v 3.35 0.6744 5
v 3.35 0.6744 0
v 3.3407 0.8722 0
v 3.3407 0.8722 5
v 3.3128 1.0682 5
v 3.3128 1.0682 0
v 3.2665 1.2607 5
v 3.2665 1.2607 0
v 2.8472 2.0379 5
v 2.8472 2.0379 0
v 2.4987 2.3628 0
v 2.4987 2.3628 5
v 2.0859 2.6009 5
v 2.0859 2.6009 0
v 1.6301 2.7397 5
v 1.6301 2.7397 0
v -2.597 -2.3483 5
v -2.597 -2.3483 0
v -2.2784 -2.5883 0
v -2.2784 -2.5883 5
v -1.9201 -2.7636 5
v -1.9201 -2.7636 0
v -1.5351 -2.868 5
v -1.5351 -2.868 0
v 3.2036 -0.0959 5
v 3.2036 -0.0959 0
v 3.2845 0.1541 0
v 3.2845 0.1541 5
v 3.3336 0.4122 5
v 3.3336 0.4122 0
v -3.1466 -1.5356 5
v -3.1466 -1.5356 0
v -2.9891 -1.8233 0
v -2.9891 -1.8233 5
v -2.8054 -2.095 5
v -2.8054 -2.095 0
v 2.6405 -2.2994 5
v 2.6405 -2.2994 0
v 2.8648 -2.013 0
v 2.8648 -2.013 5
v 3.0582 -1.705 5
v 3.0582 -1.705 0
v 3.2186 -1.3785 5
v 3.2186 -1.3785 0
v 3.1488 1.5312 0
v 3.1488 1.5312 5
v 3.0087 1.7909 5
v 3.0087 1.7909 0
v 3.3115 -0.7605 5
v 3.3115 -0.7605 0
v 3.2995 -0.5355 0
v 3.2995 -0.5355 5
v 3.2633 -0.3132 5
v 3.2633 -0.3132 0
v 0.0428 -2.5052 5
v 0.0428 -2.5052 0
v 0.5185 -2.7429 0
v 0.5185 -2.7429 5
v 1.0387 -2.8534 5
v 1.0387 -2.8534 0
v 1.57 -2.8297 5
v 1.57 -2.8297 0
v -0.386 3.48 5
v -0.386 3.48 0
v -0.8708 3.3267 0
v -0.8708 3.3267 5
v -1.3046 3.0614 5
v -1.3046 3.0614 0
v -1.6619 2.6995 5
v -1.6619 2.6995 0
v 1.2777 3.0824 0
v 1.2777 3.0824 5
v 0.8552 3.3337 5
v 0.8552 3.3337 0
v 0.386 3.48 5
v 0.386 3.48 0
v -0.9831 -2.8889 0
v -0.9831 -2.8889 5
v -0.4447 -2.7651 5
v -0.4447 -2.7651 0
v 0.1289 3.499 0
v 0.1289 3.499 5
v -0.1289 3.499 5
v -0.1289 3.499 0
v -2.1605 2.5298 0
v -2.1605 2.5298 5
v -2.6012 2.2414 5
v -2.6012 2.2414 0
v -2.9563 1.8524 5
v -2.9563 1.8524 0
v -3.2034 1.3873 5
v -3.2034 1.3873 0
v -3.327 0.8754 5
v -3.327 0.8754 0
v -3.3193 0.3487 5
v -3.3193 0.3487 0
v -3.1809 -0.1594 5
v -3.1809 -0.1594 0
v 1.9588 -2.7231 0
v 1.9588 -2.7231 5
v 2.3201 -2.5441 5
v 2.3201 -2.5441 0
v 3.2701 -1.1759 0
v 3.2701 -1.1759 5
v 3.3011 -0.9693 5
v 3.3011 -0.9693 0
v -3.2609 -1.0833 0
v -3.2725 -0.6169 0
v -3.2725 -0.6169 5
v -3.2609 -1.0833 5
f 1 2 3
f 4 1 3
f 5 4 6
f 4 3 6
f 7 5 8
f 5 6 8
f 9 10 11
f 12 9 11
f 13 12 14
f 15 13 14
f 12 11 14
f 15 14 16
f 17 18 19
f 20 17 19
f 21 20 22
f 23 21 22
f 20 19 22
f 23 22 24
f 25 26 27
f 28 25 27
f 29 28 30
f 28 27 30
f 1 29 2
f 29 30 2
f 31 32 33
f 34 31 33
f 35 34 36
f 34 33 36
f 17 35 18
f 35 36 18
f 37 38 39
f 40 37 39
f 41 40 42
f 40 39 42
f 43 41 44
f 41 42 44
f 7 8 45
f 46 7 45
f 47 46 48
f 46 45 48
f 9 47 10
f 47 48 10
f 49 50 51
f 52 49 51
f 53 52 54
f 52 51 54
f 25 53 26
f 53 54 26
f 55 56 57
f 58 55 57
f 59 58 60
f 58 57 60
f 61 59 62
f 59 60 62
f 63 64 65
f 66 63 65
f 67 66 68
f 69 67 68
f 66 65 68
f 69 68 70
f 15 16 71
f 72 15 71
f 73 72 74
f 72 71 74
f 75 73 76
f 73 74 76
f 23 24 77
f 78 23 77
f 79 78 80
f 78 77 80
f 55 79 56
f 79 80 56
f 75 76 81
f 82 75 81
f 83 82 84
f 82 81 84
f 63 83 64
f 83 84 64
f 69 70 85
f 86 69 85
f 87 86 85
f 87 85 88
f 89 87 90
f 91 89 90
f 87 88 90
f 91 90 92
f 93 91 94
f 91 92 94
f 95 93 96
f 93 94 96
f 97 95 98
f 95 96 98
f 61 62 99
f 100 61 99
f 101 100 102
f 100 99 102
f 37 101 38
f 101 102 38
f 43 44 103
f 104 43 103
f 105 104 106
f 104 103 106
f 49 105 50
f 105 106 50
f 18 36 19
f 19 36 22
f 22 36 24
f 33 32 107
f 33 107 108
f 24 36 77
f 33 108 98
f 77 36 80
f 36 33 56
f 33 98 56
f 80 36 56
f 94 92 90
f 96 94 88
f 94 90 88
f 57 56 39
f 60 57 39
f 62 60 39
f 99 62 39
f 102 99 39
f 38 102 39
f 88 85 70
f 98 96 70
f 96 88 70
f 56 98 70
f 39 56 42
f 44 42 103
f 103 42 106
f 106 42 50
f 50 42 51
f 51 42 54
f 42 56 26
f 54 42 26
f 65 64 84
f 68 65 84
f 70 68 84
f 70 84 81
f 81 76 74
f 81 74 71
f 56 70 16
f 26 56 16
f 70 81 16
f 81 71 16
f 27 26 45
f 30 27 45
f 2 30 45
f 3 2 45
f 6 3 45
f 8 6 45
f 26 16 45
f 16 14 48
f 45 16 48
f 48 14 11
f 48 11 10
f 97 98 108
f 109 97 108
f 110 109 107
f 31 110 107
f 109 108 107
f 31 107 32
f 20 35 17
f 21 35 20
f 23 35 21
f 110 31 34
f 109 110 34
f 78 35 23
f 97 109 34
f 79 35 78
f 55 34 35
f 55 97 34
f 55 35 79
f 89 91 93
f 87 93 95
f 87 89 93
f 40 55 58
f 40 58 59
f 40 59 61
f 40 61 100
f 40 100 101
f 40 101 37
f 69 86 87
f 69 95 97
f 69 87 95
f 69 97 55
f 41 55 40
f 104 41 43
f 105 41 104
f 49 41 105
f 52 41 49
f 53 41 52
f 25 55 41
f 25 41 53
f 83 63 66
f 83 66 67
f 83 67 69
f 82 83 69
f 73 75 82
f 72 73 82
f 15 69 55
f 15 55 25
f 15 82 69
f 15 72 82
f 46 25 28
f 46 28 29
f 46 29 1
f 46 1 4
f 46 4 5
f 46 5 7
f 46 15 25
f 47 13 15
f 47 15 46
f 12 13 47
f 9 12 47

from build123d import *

# Parameters (mm, degrees)
F1_DEPTH = 5


with BuildPart() as f1:
    # F0 (on Top) → F1 (new body)
    with BuildSketch(Plane.XY):
        with BuildLine():
            ThreePointArc((-2.0762917056, 1.1011136345), (-2.0328031028, 1.9427599936), (-1.6619180303, 2.6995321623))
            ThreePointArc((-1.6619180303, 2.6995321623), (-3.094460966, 1.6276524291), (-3.1808633019, -0.159423412))
            ThreePointArc((-3.1808633019, -0.159423412), (-2.759782015, 0.5858157715), (-2.0762917056, 1.1011136345))
        make_face()
        with BuildLine():
            ThreePointArc((-0.0167437519, 2.3493378491), (0.7655920202, 2.7177846989), (1.630068956, 2.739738487))
            ThreePointArc((1.630068956, 2.739738487), (1.0738291564, 3.2204623839), (0.3859787662, 3.4800004745))
            ThreePointArc((0.3859787662, 3.4800004745), (0, 3.5013401592), (-0.3859787662, 3.4800004745))
            ThreePointArc((-0.3859787662, 3.4800004745), (-1.0957887656, 3.2072136818), (-1.6619180303, 2.6995321623))
            ThreePointArc((-1.6619180303, 2.6995321623), (-0.8027377303, 2.6963456411), (-0.0167437519, 2.3493378491))
        make_face()
        with BuildLine():
            ThreePointArc((-0.7665170517, 1.2606372323), (-0.4795280781, 1.8655214743), (-0.0167437519, 2.3493378491))
            ThreePointArc((-0.0167437519, 2.3493378491), (-0.8027377303, 2.6963456411), (-1.6619180303, 2.6995321623))
            ThreePointArc((-1.6619180303, 2.6995321623), (-2.0328031028, 1.9427599936), (-2.0762917056, 1.1011136345))
            ThreePointArc((-2.0762917056, 1.1011136345), (-1.4342585803, 1.2864153522), (-0.7665170517, 1.2606372323))
        make_face()
        with BuildLine():
            ThreePointArc((-0.8417890227, 0.4889120152), (-0.8400800334, 0.8782788449), (-0.7665170517, 1.2606372323))
            ThreePointArc((-0.7665170517, 1.2606372323), (-1.4342585803, 1.2864153522), (-2.0762917056, 1.1011136345))
            ThreePointArc((-2.0762917056, 1.1011136345), (-1.892548263, 0.5056880575), (-1.5421690484, -0.0096057192))
            ThreePointArc((-1.5421690484, -0.0096057192), (-1.2177618831, 0.275876115), (-0.8417890227, 0.4889120152))
        make_face()
        with BuildLine():
            ThreePointArc((-1.5421690484, -0.0096057192), (-1.892548263, 0.5056880575), (-2.0762917056, 1.1011136345))
            ThreePointArc((-2.0762917056, 1.1011136345), (-2.759782015, 0.5858157715), (-3.1808633019, -0.159423412))
            ThreePointArc((-3.1808633019, -0.159423412), (-2.7448394229, -0.8223254079), (-2.0939831205, -1.2761336856))
            ThreePointArc((-2.0939831205, -1.2761336856), (-1.9252075008, -0.5961935731), (-1.5421690484, -0.0096057192))
        make_face()
        with BuildLine():
            ThreePointArc((-3.1808633019, -0.159423412), (-3.2797165139, -0.8504014439), (-3.1466307115, -1.5356100014))
            ThreePointArc((-3.1466307115, -1.5356100014), (-2.900447072, -1.9613234545), (-2.597046909, -2.3483462827))
            ThreePointArc((-2.597046909, -2.3483462827), (-2.1033871479, -2.6844547585), (-1.535075927, -2.8680064501))
            ThreePointArc((-1.535075927, -2.8680064501), (-1.9814217414, -2.1306659953), (-2.0939831205, -1.2761336856))
            ThreePointArc((-2.0939831205, -1.2761336856), (-2.7448394229, -0.8223254079), (-3.1808633019, -0.159423412))
        make_face()
        with BuildLine():
            ThreePointArc((-0.7861340261, -1.4080147657), (-1.4506432117, -1.4470408344), (-2.0939831205, -1.2761336856))
            ThreePointArc((-2.0939831205, -1.2761336856), (-1.9814217414, -2.1306659953), (-1.535075927, -2.8680064501))
            ThreePointArc((-1.535075927, -2.8680064501), (-0.709784023, -2.8447755638), (0.0427708169, -2.5052058157))
            ThreePointArc((0.0427708169, -2.5052058157), (-0.4640333051, -2.0263800649), (-0.7861340261, -1.4080147657))
        make_face()
        with BuildLine():
            ThreePointArc((-0.8715740706, -0.4948146209), (-1.2310141675, -0.2855770594), (-1.5421690484, -0.0096057192))
            ThreePointArc((-1.5421690484, -0.0096057192), (-1.9252075008, -0.5961935731), (-2.0939831205, -1.2761336856))
            ThreePointArc((-2.0939831205, -1.2761336856), (-1.4506432117, -1.4470408344), (-0.7861340261, -1.4080147657))
            ThreePointArc((-0.7861340261, -1.4080147657), (-0.8793187986, -0.9561362328), (-0.8715740706, -0.4948146209))
        make_face()
        with BuildLine():
            ThreePointArc((-0.742059757, 0.009818867), (-0.8059274631, 0.2464505253), (-0.8417890227, 0.4889120152))
            ThreePointArc((-0.8417890227, 0.4889120152), (-1.2177618831, 0.275876115), (-1.5421690484, -0.0096057192))
            ThreePointArc((-1.5421690484, -0.0096057192), (-1.2310141675, -0.2855770594), (-0.8715740706, -0.4948146209))
            ThreePointArc((-0.8715740706, -0.4948146209), (-0.8225268781, -0.2384659106), (-0.742059757, 0.009818867))
        make_face()
        with BuildLine():
            ThreePointArc((-0.0115869939, 0.9465134466), (-0.373615573, 1.1406735804), (-0.7665170517, 1.2606372323))
            ThreePointArc((-0.7665170517, 1.2606372323), (-0.8400800334, 0.8782788449), (-0.8417890227, 0.4889120152))
            ThreePointArc((-0.8417890227, 0.4889120152), (-0.6044808447, 0.5761318216), (-0.3584107831, 0.634200667))
            ThreePointArc((-0.3584107831, 0.634200667), (-0.1937021555, 0.8000220473), (-0.0115869939, 0.9465134466))
        make_face()
        with BuildLine():
            ThreePointArc((-0.3800674705, -0.6495439334), (0.0213422754, -0.6841149921), (0.4219664467, -0.6413924512))
            ThreePointArc((0.4219664467, -0.6413924512), (0.6194374425, -0.3336862528), (0.7605458039, 0.0036063931))
            ThreePointArc((0.7605458039, 0.0036063931), (0.5860530482, 0.3374976169), (0.3547100125, 0.6348382816))
            ThreePointArc((0.3547100125, 0.6348382816), (-0.0018776485, 0.6650111676), (-0.3584107831, 0.634200667))
            ThreePointArc((-0.3584107831, 0.634200667), (-0.5776818213, 0.3388741939), (-0.742059757, 0.009818867))
            ThreePointArc((-0.742059757, 0.009818867), (-0.590826214, -0.336202296), (-0.3800674705, -0.6495439334))
        make_face()
        with BuildLine():
            ThreePointArc((0.8600484164, 0.6423631567), (0.8343116475, 0.9701314411), (0.75773218, 1.2898657287))
            ThreePointArc((0.75773218, 1.2898657287), (0.3556778901, 1.1571643643), (-0.0115869939, 0.9465134466))
            ThreePointArc((-0.0115869939, 0.9465134466), (0.1805136214, 0.801196856), (0.3547100125, 0.6348382816))
            ThreePointArc((0.3547100125, 0.6348382816), (0.6090888134, 0.5747410478), (0.854031537, 0.4835088493))
            ThreePointArc((0.854031537, 0.4835088493), (0.8585436575, 0.5628790485), (0.8600484164, 0.6423631567))
        make_face()
        with BuildLine():
            ThreePointArc((0.75773218, 1.2898657287), (0.4553820003, 1.8816549058), (-0.0167437519, 2.3493378491))
            ThreePointArc((-0.0167437519, 2.3493378491), (-0.4795280781, 1.8655214743), (-0.7665170517, 1.2606372323))
            ThreePointArc((-0.7665170517, 1.2606372323), (-0.373615573, 1.1406735804), (-0.0115869939, 0.9465134466))
            ThreePointArc((-0.0115869939, 0.9465134466), (0.3556778901, 1.1571643643), (0.75773218, 1.2898657287))
        make_face()
        with BuildLine():
            ThreePointArc((2.0831238081, 1.1500789817), (2.0957767053, 1.2826600585), (2.1, 1.4157765545))
            ThreePointArc((2.1, 1.4157765545), (1.9790331993, 2.1182205709), (1.630068956, 2.739738487))
            ThreePointArc((1.630068956, 2.739738487), (0.7655920202, 2.7177846989), (-0.0167437519, 2.3493378491))
            ThreePointArc((-0.0167437519, 2.3493378491), (0.4553820003, 1.8816549058), (0.75773218, 1.2898657287))
            ThreePointArc((0.75773218, 1.2898657287), (1.4318114221, 1.3279046206), (2.0831238081, 1.1500789817))
        make_face()
        with BuildLine():
            ThreePointArc((1.630068956, 2.739738487), (1.9790331993, 2.1182205709), (2.1, 1.4157765545))
            ThreePointArc((2.1, 1.4157765545), (2.0957767053, 1.2826600585), (2.0831238081, 1.1500789817))
            ThreePointArc((2.0831238081, 1.1500789817), (2.7730316761, 0.6436865656), (3.2036109799, -0.0959130616))
            ThreePointArc((3.2036109799, -0.0959130616), (3.3130792758, 0.2823592908), (3.3500014855, 0.6744179991))
            ThreePointArc((3.3500014855, 0.6744179991), (3.3290235807, 0.9705043508), (3.2665089829, 1.2606752061))
            ThreePointArc((3.2665089829, 1.2606752061), (3.0814485688, 1.6625455268), (2.8471862771, 2.0378697735))
            ThreePointArc((2.8471862771, 2.0378697735), (2.2990660925, 2.4936110758), (1.630068956, 2.739738487))
        make_face()
        with BuildLine():
            ThreePointArc((3.3115497375, -0.7605121937), (3.2843894092, -0.4238585208), (3.2036109799, -0.0959130616))
            ThreePointArc((3.2036109799, -0.0959130616), (2.7620344039, -0.7828933792), (2.0917905081, -1.249482009))
            ThreePointArc((2.0917905081, -1.249482009), (2.0979466231, -1.3421442185), (2.1, -1.434987993))
            ThreePointArc((2.1, -1.434987993), (1.9630228085, -2.1810050527), (1.5699605206, -2.8297008536))
            ThreePointArc((1.5699605206, -2.8297008536), (2.1437468532, -2.6422689626), (2.6405135235, -2.2993632256))
            ThreePointArc((2.6405135235, -2.2993632256), (2.9655016033, -1.8615002421), (3.2185638821, -1.3784881021))
            ThreePointArc((3.2185638821, -1.3784881021), (3.2881731631, -1.0729784289), (3.3115497375, -0.7605121937))
        make_face()
        with BuildLine():
            ThreePointArc((3.2036109799, -0.0959130616), (2.7730316761, 0.6436865656), (2.0831238081, 1.1500789817))
            ThreePointArc((2.0831238081, 1.1500789817), (1.9031301125, 0.5280289694), (1.5421690484, -0.0096057192))
            ThreePointArc((1.5421690484, -0.0096057192), (1.9198278095, -0.5839526342), (2.0917905081, -1.249482009))
            ThreePointArc((2.0917905081, -1.249482009), (2.7620344039, -0.7828933792), (3.2036109799, -0.0959130616))
        make_face()
        with BuildLine():
            ThreePointArc((2.1, -1.434987993), (2.0979466231, -1.3421442185), (2.0917905081, -1.249482009))
            ThreePointArc((2.0917905081, -1.249482009), (1.4743536, -1.4135633535), (0.8361526227, -1.3843994087))
            ThreePointArc((0.8361526227, -1.3843994087), (0.5336624736, -2.0114842119), (0.0427708169, -2.5052058157))
            ThreePointArc((0.0427708169, -2.5052058157), (0.7750885285, -2.814654743), (1.5699605206, -2.8297008536))
            ThreePointArc((1.5699605206, -2.8297008536), (1.9630228085, -2.1810050527), (2.1, -1.434987993))
        make_face()
        with BuildLine():
            ThreePointArc((0.0427708169, -2.5052058157), (0.5336624736, -2.0114842119), (0.8361526227, -1.3843994087))
            ThreePointArc((0.8361526227, -1.3843994087), (0.4127816939, -1.2514747862), (0.0267936538, -1.0325566933))
            ThreePointArc((0.0267936538, -1.0325566933), (-0.3594254489, -1.2641188722), (-0.7861340261, -1.4080147657))
            ThreePointArc((-0.7861340261, -1.4080147657), (-0.4640333051, -2.0263800649), (0.0427708169, -2.5052058157))
        make_face()
        with BuildLine():
            ThreePointArc((0.0267936538, -1.0325566933), (-0.1894330564, -0.8546432161), (-0.3800674705, -0.6495439334))
            ThreePointArc((-0.3800674705, -0.6495439334), (-0.6305845914, -0.5873118293), (-0.8715740706, -0.4948146209))
            ThreePointArc((-0.8715740706, -0.4948146209), (-0.8793187986, -0.9561362328), (-0.7861340261, -1.4080147657))
            ThreePointArc((-0.7861340261, -1.4080147657), (-0.3594254489, -1.2641188722), (0.0267936538, -1.0325566933))
        make_face()
        with BuildLine():
            ThreePointArc((0.9196340855, -0.7981801755), (0.9136986239, -0.6404027718), (0.8959257911, -0.4835172555))
            ThreePointArc((0.8959257911, -0.4835172555), (0.6636573905, -0.576598628), (0.4219664467, -0.6413924512))
            ThreePointArc((0.4219664467, -0.6413924512), (0.2373836864, -0.8501114663), (0.0267936538, -1.0325566933))
            ThreePointArc((0.0267936538, -1.0325566933), (0.4127816939, -1.2514747862), (0.8361526227, -1.3843994087))
            ThreePointArc((0.8361526227, -1.3843994087), (0.8986589685, -1.0942469518), (0.9196340855, -0.7981801755))
        make_face()
        with BuildLine():
            ThreePointArc((2.0917905081, -1.249482009), (1.9198278095, -0.5839526342), (1.5421690484, -0.0096057192))
            ThreePointArc((1.5421690484, -0.0096057192), (1.2418633772, -0.2776741688), (0.8959257911, -0.4835172555))
            ThreePointArc((0.8959257911, -0.4835172555), (0.9136986239, -0.6404027718), (0.9196340855, -0.7981801755))
            ThreePointArc((0.9196340855, -0.7981801755), (0.8986589685, -1.0942469518), (0.8361526227, -1.3843994087))
            ThreePointArc((0.8361526227, -1.3843994087), (1.4743536, -1.4135633535), (2.0917905081, -1.249482009))
        make_face()
        with BuildLine():
            ThreePointArc((0.8959257911, -0.4835172555), (1.2418633772, -0.2776741688), (1.5421690484, -0.0096057192))
            ThreePointArc((1.5421690484, -0.0096057192), (1.2232067714, 0.2719874592), (0.854031537, 0.4835088493))
            ThreePointArc((0.854031537, 0.4835088493), (0.8213027068, 0.2408276655), (0.7605458039, 0.0036063931))
            ThreePointArc((0.7605458039, 0.0036063931), (0.8429489892, -0.2358663837), (0.8959257911, -0.4835172555))
        make_face()
        with BuildLine():
            ThreePointArc((1.5421690484, -0.0096057192), (1.9031301125, 0.5280289694), (2.0831238081, 1.1500789817))
            ThreePointArc((2.0831238081, 1.1500789817), (1.4318114221, 1.3279046206), (0.75773218, 1.2898657287))
            ThreePointArc((0.75773218, 1.2898657287), (0.8343116475, 0.9701314411), (0.8600484164, 0.6423631567))
            ThreePointArc((0.8600484164, 0.6423631567), (0.8585436575, 0.5628790485), (0.854031537, 0.4835088493))
            ThreePointArc((0.854031537, 0.4835088493), (1.2232067714, 0.2719874592), (1.5421690484, -0.0096057192))
        make_face()
        with BuildLine():
            ThreePointArc((0.0267936538, -1.0325566933), (0.2373836864, -0.8501114663), (0.4219664467, -0.6413924512))
            ThreePointArc((0.4219664467, -0.6413924512), (0.0213422754, -0.6841149921), (-0.3800674705, -0.6495439334))
            ThreePointArc((-0.3800674705, -0.6495439334), (-0.1894330564, -0.8546432161), (0.0267936538, -1.0325566933))
        make_face()
        with BuildLine():
            ThreePointArc((-0.3800674705, -0.6495439334), (-0.590826214, -0.336202296), (-0.742059757, 0.009818867))
            ThreePointArc((-0.742059757, 0.009818867), (-0.8225268781, -0.2384659106), (-0.8715740706, -0.4948146209))
            ThreePointArc((-0.8715740706, -0.4948146209), (-0.6305845914, -0.5873118293), (-0.3800674705, -0.6495439334))
        make_face()
        with BuildLine():
            ThreePointArc((-0.3584107831, 0.634200667), (-0.6044808447, 0.5761318216), (-0.8417890227, 0.4889120152))
            ThreePointArc((-0.8417890227, 0.4889120152), (-0.8059274631, 0.2464505253), (-0.742059757, 0.009818867))
            ThreePointArc((-0.742059757, 0.009818867), (-0.5776818213, 0.3388741939), (-0.3584107831, 0.634200667))
        make_face()
        with BuildLine():
            ThreePointArc((0.3547100125, 0.6348382816), (0.1805136214, 0.801196856), (-0.0115869939, 0.9465134466))
            ThreePointArc((-0.0115869939, 0.9465134466), (-0.1937021555, 0.8000220473), (-0.3584107831, 0.634200667))
            ThreePointArc((-0.3584107831, 0.634200667), (-0.0018776485, 0.6650111676), (0.3547100125, 0.6348382816))
        make_face()
        with BuildLine():
            ThreePointArc((0.7605458039, 0.0036063931), (0.8213027068, 0.2408276655), (0.854031537, 0.4835088493))
            ThreePointArc((0.854031537, 0.4835088493), (0.6090888134, 0.5747410478), (0.3547100125, 0.6348382816))
            ThreePointArc((0.3547100125, 0.6348382816), (0.5860530482, 0.3374976169), (0.7605458039, 0.0036063931))
        make_face()
        with BuildLine():
            ThreePointArc((0.4219664467, -0.6413924512), (0.6636573905, -0.576598628), (0.8959257911, -0.4835172555))
            ThreePointArc((0.8959257911, -0.4835172555), (0.8429489892, -0.2358663837), (0.7605458039, 0.0036063931))
            ThreePointArc((0.7605458039, 0.0036063931), (0.6194374425, -0.3336862528), (0.4219664467, -0.6413924512))
        make_face()
    extrude(amount=F1_DEPTH)


solid = f1.part
